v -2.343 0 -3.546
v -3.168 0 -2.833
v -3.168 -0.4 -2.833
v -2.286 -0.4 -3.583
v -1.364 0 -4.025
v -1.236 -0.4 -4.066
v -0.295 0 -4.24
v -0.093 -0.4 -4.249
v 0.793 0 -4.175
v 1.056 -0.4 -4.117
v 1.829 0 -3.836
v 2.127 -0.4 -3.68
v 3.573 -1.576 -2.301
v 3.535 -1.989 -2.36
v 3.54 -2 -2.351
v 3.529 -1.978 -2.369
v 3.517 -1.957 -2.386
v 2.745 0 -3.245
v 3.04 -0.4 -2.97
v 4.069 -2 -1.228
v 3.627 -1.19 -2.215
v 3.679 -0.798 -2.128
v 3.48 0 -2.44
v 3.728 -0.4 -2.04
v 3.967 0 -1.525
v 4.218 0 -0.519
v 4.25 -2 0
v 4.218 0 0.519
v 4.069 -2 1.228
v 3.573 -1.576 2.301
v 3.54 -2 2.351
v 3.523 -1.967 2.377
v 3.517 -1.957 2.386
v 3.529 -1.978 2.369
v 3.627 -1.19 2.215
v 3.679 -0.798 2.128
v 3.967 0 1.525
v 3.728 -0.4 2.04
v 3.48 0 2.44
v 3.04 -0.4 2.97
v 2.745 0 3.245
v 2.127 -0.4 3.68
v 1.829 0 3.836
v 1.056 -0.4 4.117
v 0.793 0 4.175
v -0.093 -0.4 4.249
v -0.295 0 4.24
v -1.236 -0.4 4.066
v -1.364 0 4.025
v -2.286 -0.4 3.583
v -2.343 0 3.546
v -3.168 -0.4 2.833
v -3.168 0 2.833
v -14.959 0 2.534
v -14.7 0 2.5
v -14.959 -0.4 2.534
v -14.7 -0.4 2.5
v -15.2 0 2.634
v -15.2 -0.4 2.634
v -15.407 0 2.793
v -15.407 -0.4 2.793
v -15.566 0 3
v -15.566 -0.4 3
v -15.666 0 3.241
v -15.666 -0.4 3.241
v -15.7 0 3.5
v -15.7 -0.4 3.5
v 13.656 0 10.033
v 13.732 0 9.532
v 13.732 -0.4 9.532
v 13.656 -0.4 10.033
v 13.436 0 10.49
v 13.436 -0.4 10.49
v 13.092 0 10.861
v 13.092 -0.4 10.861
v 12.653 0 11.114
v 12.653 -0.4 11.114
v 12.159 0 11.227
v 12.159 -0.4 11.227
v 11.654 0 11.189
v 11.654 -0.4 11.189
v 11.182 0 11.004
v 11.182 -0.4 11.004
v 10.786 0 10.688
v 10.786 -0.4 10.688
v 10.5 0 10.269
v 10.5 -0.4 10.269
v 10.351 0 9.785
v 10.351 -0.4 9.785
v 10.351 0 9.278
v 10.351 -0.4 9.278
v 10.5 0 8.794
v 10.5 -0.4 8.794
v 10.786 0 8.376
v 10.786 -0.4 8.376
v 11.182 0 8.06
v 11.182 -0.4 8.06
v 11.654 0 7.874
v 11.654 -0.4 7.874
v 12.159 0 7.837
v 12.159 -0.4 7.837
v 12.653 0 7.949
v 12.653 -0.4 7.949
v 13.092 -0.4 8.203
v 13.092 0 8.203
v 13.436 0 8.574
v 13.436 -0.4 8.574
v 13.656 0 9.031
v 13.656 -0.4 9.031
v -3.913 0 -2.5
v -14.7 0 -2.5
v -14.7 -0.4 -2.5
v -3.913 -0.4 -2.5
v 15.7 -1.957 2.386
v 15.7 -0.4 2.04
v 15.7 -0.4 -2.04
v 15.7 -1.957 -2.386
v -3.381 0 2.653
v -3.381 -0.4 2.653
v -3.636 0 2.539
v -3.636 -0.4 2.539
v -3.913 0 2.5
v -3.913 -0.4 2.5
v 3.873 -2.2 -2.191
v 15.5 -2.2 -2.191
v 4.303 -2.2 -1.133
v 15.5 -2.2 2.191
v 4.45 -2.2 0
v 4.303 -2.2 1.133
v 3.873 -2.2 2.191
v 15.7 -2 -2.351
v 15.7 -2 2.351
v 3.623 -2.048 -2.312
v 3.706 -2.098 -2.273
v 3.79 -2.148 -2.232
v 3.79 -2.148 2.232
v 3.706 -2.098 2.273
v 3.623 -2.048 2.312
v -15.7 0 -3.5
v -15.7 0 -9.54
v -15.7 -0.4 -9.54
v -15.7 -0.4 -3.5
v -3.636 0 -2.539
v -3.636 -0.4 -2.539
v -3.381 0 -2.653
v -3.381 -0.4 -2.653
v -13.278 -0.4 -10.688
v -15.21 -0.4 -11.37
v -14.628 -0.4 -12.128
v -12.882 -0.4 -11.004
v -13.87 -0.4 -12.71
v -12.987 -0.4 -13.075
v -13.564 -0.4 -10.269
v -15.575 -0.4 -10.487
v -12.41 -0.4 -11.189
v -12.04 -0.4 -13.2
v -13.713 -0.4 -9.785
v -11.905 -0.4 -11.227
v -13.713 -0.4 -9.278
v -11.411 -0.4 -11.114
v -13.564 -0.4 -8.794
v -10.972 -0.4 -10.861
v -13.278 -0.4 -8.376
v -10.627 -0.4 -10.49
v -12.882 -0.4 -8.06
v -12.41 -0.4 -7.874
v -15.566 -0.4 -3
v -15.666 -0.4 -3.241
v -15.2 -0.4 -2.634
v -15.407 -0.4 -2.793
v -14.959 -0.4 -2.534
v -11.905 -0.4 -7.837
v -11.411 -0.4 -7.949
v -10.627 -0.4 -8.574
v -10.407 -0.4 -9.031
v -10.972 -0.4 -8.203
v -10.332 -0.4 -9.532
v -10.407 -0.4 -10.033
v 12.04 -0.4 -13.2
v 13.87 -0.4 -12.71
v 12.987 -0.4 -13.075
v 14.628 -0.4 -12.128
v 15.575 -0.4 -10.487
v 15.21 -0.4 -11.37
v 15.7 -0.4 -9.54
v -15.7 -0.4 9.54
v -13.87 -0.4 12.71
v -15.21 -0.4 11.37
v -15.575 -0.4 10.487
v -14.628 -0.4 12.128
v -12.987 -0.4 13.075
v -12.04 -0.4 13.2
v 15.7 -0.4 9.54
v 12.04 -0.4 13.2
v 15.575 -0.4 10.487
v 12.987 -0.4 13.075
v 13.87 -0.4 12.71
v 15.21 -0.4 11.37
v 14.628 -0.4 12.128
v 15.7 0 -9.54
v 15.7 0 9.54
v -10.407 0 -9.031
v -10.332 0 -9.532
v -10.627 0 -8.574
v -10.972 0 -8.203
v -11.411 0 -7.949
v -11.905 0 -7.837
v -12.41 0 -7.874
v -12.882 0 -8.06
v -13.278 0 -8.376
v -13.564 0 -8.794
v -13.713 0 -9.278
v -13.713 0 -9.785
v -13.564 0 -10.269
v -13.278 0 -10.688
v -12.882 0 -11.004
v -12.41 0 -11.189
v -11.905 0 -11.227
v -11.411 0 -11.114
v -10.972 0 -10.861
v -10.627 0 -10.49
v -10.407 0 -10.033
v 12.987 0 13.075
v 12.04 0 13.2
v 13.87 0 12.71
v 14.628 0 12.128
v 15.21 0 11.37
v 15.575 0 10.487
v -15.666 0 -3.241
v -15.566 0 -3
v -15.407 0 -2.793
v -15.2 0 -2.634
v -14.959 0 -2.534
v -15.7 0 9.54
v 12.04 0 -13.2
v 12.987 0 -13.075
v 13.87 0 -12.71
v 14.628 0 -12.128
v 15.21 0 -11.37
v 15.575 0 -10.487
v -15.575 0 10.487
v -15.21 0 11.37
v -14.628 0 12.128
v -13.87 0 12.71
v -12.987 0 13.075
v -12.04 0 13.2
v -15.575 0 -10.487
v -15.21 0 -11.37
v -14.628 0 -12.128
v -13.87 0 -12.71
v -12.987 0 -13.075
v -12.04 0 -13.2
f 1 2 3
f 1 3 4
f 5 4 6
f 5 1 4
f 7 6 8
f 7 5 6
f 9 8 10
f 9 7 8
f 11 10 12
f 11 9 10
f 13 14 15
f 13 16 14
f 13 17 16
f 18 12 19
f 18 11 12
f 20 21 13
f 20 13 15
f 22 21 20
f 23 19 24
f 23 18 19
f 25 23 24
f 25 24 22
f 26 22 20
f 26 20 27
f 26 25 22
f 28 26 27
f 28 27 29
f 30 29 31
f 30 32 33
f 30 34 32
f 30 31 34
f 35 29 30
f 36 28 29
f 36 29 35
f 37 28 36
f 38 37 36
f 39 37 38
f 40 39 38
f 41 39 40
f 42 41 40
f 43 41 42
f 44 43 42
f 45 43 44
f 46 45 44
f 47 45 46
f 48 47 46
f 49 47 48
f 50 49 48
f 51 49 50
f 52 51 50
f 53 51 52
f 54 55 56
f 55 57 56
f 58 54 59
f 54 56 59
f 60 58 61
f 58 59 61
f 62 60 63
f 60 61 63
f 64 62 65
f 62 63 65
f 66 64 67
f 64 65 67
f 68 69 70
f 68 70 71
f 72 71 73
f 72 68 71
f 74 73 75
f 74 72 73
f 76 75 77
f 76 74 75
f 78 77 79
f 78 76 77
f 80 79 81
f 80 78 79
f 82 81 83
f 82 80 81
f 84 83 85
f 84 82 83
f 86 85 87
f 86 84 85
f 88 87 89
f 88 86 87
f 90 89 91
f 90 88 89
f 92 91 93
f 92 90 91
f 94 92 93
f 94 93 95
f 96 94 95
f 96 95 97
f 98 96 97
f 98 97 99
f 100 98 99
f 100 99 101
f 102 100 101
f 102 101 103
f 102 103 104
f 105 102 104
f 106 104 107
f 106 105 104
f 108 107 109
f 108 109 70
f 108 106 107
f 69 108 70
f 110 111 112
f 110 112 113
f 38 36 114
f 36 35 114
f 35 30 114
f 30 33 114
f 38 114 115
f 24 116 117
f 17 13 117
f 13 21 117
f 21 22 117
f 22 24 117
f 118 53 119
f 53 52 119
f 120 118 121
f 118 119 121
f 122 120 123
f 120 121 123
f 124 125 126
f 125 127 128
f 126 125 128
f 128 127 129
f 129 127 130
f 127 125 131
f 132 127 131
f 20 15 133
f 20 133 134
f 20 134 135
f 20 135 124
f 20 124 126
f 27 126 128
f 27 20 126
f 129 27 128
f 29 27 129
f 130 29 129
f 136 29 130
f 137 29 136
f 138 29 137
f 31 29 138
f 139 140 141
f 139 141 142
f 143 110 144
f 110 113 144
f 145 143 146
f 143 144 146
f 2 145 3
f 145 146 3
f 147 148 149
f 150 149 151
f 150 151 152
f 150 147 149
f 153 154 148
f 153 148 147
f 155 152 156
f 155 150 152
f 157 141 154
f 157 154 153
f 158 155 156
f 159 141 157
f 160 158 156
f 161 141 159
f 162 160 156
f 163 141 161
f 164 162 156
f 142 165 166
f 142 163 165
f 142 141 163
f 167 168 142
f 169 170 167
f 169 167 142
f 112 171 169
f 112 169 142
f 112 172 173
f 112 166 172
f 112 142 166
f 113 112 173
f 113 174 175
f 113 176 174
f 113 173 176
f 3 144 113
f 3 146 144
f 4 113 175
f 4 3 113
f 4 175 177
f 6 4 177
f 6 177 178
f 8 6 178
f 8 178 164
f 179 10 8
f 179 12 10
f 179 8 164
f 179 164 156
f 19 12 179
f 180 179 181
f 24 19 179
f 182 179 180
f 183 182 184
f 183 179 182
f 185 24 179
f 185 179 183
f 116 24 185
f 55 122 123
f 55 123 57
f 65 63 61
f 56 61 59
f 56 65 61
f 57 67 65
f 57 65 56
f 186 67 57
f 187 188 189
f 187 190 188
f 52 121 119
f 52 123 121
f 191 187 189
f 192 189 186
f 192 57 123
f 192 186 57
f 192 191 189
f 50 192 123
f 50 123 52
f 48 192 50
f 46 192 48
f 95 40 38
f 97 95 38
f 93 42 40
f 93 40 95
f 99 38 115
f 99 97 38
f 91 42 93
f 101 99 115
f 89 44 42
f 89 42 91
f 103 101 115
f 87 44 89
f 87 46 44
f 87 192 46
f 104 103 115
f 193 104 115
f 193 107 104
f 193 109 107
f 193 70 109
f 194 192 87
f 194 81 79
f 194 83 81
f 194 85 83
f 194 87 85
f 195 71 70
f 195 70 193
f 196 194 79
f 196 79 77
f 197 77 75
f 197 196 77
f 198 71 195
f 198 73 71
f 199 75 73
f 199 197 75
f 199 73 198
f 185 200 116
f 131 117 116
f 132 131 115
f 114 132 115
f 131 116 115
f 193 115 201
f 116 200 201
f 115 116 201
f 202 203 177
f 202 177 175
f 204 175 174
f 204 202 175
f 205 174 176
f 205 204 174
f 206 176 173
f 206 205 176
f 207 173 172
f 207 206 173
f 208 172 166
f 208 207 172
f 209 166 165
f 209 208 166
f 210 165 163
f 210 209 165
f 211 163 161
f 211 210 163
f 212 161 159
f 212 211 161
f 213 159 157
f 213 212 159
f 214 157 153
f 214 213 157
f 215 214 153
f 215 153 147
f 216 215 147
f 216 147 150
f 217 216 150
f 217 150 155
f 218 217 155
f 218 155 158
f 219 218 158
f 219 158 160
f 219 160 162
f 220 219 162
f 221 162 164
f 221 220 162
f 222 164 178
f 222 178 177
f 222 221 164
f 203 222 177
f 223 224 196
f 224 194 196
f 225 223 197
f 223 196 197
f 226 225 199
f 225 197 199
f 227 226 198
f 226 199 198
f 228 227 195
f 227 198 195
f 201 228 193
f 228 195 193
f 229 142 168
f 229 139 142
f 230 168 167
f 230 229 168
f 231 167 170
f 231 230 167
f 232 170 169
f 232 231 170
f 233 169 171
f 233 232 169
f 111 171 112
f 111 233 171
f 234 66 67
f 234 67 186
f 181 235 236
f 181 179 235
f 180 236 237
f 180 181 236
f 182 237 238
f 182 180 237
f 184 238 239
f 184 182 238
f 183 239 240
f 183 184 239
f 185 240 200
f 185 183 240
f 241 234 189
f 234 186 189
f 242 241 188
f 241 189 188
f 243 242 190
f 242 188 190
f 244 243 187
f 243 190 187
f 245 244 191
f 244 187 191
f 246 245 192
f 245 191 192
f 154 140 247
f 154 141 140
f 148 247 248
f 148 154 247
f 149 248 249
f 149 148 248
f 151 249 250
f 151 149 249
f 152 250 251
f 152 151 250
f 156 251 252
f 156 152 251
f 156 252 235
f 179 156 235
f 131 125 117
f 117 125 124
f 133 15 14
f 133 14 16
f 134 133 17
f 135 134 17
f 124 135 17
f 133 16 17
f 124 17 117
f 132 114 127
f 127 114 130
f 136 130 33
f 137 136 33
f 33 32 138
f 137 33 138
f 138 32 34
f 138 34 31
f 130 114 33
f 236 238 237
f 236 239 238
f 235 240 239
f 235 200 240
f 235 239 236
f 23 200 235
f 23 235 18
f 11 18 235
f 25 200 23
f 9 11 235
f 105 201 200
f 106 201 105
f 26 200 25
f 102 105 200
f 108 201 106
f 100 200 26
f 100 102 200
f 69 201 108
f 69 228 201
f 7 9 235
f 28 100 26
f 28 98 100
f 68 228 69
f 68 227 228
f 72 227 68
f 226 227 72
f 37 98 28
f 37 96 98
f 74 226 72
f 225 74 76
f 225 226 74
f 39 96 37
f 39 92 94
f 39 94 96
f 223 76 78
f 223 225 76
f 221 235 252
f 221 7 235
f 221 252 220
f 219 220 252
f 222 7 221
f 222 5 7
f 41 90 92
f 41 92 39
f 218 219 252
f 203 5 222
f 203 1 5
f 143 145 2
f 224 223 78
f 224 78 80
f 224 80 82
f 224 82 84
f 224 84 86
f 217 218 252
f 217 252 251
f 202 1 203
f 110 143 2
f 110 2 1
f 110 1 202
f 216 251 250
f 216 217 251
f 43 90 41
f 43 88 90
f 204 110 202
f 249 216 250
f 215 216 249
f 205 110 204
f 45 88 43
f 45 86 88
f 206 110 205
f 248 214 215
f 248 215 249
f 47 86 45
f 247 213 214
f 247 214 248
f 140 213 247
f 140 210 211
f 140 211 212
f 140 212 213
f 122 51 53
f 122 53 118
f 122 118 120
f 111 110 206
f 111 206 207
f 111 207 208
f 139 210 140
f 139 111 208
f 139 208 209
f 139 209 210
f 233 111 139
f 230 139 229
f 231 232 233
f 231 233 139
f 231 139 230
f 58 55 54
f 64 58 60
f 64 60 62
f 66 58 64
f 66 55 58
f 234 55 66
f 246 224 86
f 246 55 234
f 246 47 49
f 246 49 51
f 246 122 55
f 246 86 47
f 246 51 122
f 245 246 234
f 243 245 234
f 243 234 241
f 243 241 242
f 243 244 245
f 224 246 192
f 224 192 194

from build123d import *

# Parameters (mm, degrees)
F0_W         = 31.4
F0_H         = 26.4
F0_R         = 1.7
F1_DEPTH     = 0.4
F2_R         = 3.66
F4_DEPTH     = 25
F5_R         = 1
F7_DEPTH     = 2.2
F9_DEPTH     = 25
F10_T1_DEPTH = 13.4922434022
F10_T3_DEPTH = 5.9086731952
F10_T6_ANGLE = 83.9470182362


# Not quite as in the source:
# - a fillet or chamfer that OpenCascade refuses, or shapes differently, is made with other operations: its cross-section is extruded or revolved along the edge and cut away or added


with BuildPart() as f1:
    # F0 (on Front) → F1 (new body)
    with BuildSketch(Plane.XZ):
        Rectangle(F0_W, F0_H)
        with Locations((-12.0318713589, -9.5318713589)):
            Circle(F0_R, mode=Mode.SUBTRACT)
        with Locations((12.0318713589, 9.5318713589)):
            Circle(F0_R, mode=Mode.SUBTRACT)
    extrude(amount=F1_DEPTH)

    # F2
    f2_edges = [f1.edges().sort_by_distance(p)[0] for p in [
        (15.7, -0.2, -13.2),
        (15.7, -0.2, 13.2),
        (-15.7, -0.2, -13.2),
        (-15.7, -0.2, 13.2),
    ]]
    fillet(f2_edges, radius=F2_R)

    # F3 (on Front) → F4 (cut)
    with BuildSketch(Plane.XZ):
        with BuildLine():
            Line((-21.9406711915, -2.5), (-3.4369317712, -2.5))
            ThreePointArc((-3.4369317712, -2.5), (4.25, 0), (-3.4369317712, 2.5))
            Line((-3.4369317712, 2.5), (-21.9406711915, 2.5))
            Line((-21.9406711915, 2.5), (-21.9406711915, -2.5))
        make_face()
    extrude(amount=F4_DEPTH, mode=Mode.SUBTRACT)

    # F5
    f5_edges = [f1.edges().sort_by_distance(p)[0] for p in [
        (-3.436932, -0.2, -2.5),
        (-3.436932, -0.2, 2.5),
        (-15.7, -0.2, 2.5),
        (-15.7, -0.2, -2.5),
    ]]
    fillet(f5_edges, radius=F5_R)

    # F6 (on face) → F7 (join)
    with BuildSketch(Plane(origin=(0, 0, 0), x_dir=(-1, 0, 0), z_dir=(0, 1, 0))):
        with BuildLine():
            Line((-3.4797844761, 2.44), (-15.7, 2.44))
            Line((-15.7, 2.44), (-15.7, -2.44))
            Line((-15.7, -2.44), (-3.4797844761, -2.44))
            ThreePointArc((-3.4797844761, -2.44), (-4.25, 0), (-3.4797844761, 2.44))
        make_face()
    extrude(amount=-F7_DEPTH)

    # F8 (on face) → F9 (cut)
    with BuildSketch(Plane.YZ.offset(15.7)):
        Polygon((-0.4, 2.44), (-2.2, 2.44), (-0.4, 2.04), align=None)
        Polygon((-0.4, -2.04), (-2.2, -2.44), (-0.4, -2.44), align=None)
    extrude(amount=-F9_DEPTH, mode=Mode.SUBTRACT)

    # F10: chamfer of 0.2 on 4 edges, made by hand

    # F10_s2 → F10_t1 (cut)
    with BuildSketch(Plane.YZ.offset(2.8437705369)):
        Polygon((-1.9566139084, 2.3859142019), (-2.2, 2.1906767898), (-2.2, 2.44), align=None)
        Polygon((-2.2, -2.1906767898), (-1.9566139084, -2.3859142019), (-2.2, -2.44), align=None)
    extrude(amount=F10_T1_DEPTH, mode=Mode.SUBTRACT)

    # F10_s4 → F10_t3 (cut)
    with BuildSketch(Plane.XY.offset(-2.9543365976)):
        Polygon((15.5, -2.2), (15.7, -2), (15.7, -2.2), align=None)
    extrude(amount=F10_T3_DEPTH, mode=Mode.SUBTRACT)

    # F10_s5 → F10_t6 (revolve, cut)
    with BuildSketch(Plane(origin=(0, 0, 0), x_dir=(0, 1, 0), z_dir=(-0.6687869395, 0, -0.7434541207))):
        Polygon((-2.2, 4.45), (-2, 4.25), (-2.2, 4.25), align=None)
    revolve(axis=Axis((0, -2.2, 0), (0, -1, 0)), revolution_arc=F10_T6_ANGLE, mode=Mode.SUBTRACT)


solid = f1.part
